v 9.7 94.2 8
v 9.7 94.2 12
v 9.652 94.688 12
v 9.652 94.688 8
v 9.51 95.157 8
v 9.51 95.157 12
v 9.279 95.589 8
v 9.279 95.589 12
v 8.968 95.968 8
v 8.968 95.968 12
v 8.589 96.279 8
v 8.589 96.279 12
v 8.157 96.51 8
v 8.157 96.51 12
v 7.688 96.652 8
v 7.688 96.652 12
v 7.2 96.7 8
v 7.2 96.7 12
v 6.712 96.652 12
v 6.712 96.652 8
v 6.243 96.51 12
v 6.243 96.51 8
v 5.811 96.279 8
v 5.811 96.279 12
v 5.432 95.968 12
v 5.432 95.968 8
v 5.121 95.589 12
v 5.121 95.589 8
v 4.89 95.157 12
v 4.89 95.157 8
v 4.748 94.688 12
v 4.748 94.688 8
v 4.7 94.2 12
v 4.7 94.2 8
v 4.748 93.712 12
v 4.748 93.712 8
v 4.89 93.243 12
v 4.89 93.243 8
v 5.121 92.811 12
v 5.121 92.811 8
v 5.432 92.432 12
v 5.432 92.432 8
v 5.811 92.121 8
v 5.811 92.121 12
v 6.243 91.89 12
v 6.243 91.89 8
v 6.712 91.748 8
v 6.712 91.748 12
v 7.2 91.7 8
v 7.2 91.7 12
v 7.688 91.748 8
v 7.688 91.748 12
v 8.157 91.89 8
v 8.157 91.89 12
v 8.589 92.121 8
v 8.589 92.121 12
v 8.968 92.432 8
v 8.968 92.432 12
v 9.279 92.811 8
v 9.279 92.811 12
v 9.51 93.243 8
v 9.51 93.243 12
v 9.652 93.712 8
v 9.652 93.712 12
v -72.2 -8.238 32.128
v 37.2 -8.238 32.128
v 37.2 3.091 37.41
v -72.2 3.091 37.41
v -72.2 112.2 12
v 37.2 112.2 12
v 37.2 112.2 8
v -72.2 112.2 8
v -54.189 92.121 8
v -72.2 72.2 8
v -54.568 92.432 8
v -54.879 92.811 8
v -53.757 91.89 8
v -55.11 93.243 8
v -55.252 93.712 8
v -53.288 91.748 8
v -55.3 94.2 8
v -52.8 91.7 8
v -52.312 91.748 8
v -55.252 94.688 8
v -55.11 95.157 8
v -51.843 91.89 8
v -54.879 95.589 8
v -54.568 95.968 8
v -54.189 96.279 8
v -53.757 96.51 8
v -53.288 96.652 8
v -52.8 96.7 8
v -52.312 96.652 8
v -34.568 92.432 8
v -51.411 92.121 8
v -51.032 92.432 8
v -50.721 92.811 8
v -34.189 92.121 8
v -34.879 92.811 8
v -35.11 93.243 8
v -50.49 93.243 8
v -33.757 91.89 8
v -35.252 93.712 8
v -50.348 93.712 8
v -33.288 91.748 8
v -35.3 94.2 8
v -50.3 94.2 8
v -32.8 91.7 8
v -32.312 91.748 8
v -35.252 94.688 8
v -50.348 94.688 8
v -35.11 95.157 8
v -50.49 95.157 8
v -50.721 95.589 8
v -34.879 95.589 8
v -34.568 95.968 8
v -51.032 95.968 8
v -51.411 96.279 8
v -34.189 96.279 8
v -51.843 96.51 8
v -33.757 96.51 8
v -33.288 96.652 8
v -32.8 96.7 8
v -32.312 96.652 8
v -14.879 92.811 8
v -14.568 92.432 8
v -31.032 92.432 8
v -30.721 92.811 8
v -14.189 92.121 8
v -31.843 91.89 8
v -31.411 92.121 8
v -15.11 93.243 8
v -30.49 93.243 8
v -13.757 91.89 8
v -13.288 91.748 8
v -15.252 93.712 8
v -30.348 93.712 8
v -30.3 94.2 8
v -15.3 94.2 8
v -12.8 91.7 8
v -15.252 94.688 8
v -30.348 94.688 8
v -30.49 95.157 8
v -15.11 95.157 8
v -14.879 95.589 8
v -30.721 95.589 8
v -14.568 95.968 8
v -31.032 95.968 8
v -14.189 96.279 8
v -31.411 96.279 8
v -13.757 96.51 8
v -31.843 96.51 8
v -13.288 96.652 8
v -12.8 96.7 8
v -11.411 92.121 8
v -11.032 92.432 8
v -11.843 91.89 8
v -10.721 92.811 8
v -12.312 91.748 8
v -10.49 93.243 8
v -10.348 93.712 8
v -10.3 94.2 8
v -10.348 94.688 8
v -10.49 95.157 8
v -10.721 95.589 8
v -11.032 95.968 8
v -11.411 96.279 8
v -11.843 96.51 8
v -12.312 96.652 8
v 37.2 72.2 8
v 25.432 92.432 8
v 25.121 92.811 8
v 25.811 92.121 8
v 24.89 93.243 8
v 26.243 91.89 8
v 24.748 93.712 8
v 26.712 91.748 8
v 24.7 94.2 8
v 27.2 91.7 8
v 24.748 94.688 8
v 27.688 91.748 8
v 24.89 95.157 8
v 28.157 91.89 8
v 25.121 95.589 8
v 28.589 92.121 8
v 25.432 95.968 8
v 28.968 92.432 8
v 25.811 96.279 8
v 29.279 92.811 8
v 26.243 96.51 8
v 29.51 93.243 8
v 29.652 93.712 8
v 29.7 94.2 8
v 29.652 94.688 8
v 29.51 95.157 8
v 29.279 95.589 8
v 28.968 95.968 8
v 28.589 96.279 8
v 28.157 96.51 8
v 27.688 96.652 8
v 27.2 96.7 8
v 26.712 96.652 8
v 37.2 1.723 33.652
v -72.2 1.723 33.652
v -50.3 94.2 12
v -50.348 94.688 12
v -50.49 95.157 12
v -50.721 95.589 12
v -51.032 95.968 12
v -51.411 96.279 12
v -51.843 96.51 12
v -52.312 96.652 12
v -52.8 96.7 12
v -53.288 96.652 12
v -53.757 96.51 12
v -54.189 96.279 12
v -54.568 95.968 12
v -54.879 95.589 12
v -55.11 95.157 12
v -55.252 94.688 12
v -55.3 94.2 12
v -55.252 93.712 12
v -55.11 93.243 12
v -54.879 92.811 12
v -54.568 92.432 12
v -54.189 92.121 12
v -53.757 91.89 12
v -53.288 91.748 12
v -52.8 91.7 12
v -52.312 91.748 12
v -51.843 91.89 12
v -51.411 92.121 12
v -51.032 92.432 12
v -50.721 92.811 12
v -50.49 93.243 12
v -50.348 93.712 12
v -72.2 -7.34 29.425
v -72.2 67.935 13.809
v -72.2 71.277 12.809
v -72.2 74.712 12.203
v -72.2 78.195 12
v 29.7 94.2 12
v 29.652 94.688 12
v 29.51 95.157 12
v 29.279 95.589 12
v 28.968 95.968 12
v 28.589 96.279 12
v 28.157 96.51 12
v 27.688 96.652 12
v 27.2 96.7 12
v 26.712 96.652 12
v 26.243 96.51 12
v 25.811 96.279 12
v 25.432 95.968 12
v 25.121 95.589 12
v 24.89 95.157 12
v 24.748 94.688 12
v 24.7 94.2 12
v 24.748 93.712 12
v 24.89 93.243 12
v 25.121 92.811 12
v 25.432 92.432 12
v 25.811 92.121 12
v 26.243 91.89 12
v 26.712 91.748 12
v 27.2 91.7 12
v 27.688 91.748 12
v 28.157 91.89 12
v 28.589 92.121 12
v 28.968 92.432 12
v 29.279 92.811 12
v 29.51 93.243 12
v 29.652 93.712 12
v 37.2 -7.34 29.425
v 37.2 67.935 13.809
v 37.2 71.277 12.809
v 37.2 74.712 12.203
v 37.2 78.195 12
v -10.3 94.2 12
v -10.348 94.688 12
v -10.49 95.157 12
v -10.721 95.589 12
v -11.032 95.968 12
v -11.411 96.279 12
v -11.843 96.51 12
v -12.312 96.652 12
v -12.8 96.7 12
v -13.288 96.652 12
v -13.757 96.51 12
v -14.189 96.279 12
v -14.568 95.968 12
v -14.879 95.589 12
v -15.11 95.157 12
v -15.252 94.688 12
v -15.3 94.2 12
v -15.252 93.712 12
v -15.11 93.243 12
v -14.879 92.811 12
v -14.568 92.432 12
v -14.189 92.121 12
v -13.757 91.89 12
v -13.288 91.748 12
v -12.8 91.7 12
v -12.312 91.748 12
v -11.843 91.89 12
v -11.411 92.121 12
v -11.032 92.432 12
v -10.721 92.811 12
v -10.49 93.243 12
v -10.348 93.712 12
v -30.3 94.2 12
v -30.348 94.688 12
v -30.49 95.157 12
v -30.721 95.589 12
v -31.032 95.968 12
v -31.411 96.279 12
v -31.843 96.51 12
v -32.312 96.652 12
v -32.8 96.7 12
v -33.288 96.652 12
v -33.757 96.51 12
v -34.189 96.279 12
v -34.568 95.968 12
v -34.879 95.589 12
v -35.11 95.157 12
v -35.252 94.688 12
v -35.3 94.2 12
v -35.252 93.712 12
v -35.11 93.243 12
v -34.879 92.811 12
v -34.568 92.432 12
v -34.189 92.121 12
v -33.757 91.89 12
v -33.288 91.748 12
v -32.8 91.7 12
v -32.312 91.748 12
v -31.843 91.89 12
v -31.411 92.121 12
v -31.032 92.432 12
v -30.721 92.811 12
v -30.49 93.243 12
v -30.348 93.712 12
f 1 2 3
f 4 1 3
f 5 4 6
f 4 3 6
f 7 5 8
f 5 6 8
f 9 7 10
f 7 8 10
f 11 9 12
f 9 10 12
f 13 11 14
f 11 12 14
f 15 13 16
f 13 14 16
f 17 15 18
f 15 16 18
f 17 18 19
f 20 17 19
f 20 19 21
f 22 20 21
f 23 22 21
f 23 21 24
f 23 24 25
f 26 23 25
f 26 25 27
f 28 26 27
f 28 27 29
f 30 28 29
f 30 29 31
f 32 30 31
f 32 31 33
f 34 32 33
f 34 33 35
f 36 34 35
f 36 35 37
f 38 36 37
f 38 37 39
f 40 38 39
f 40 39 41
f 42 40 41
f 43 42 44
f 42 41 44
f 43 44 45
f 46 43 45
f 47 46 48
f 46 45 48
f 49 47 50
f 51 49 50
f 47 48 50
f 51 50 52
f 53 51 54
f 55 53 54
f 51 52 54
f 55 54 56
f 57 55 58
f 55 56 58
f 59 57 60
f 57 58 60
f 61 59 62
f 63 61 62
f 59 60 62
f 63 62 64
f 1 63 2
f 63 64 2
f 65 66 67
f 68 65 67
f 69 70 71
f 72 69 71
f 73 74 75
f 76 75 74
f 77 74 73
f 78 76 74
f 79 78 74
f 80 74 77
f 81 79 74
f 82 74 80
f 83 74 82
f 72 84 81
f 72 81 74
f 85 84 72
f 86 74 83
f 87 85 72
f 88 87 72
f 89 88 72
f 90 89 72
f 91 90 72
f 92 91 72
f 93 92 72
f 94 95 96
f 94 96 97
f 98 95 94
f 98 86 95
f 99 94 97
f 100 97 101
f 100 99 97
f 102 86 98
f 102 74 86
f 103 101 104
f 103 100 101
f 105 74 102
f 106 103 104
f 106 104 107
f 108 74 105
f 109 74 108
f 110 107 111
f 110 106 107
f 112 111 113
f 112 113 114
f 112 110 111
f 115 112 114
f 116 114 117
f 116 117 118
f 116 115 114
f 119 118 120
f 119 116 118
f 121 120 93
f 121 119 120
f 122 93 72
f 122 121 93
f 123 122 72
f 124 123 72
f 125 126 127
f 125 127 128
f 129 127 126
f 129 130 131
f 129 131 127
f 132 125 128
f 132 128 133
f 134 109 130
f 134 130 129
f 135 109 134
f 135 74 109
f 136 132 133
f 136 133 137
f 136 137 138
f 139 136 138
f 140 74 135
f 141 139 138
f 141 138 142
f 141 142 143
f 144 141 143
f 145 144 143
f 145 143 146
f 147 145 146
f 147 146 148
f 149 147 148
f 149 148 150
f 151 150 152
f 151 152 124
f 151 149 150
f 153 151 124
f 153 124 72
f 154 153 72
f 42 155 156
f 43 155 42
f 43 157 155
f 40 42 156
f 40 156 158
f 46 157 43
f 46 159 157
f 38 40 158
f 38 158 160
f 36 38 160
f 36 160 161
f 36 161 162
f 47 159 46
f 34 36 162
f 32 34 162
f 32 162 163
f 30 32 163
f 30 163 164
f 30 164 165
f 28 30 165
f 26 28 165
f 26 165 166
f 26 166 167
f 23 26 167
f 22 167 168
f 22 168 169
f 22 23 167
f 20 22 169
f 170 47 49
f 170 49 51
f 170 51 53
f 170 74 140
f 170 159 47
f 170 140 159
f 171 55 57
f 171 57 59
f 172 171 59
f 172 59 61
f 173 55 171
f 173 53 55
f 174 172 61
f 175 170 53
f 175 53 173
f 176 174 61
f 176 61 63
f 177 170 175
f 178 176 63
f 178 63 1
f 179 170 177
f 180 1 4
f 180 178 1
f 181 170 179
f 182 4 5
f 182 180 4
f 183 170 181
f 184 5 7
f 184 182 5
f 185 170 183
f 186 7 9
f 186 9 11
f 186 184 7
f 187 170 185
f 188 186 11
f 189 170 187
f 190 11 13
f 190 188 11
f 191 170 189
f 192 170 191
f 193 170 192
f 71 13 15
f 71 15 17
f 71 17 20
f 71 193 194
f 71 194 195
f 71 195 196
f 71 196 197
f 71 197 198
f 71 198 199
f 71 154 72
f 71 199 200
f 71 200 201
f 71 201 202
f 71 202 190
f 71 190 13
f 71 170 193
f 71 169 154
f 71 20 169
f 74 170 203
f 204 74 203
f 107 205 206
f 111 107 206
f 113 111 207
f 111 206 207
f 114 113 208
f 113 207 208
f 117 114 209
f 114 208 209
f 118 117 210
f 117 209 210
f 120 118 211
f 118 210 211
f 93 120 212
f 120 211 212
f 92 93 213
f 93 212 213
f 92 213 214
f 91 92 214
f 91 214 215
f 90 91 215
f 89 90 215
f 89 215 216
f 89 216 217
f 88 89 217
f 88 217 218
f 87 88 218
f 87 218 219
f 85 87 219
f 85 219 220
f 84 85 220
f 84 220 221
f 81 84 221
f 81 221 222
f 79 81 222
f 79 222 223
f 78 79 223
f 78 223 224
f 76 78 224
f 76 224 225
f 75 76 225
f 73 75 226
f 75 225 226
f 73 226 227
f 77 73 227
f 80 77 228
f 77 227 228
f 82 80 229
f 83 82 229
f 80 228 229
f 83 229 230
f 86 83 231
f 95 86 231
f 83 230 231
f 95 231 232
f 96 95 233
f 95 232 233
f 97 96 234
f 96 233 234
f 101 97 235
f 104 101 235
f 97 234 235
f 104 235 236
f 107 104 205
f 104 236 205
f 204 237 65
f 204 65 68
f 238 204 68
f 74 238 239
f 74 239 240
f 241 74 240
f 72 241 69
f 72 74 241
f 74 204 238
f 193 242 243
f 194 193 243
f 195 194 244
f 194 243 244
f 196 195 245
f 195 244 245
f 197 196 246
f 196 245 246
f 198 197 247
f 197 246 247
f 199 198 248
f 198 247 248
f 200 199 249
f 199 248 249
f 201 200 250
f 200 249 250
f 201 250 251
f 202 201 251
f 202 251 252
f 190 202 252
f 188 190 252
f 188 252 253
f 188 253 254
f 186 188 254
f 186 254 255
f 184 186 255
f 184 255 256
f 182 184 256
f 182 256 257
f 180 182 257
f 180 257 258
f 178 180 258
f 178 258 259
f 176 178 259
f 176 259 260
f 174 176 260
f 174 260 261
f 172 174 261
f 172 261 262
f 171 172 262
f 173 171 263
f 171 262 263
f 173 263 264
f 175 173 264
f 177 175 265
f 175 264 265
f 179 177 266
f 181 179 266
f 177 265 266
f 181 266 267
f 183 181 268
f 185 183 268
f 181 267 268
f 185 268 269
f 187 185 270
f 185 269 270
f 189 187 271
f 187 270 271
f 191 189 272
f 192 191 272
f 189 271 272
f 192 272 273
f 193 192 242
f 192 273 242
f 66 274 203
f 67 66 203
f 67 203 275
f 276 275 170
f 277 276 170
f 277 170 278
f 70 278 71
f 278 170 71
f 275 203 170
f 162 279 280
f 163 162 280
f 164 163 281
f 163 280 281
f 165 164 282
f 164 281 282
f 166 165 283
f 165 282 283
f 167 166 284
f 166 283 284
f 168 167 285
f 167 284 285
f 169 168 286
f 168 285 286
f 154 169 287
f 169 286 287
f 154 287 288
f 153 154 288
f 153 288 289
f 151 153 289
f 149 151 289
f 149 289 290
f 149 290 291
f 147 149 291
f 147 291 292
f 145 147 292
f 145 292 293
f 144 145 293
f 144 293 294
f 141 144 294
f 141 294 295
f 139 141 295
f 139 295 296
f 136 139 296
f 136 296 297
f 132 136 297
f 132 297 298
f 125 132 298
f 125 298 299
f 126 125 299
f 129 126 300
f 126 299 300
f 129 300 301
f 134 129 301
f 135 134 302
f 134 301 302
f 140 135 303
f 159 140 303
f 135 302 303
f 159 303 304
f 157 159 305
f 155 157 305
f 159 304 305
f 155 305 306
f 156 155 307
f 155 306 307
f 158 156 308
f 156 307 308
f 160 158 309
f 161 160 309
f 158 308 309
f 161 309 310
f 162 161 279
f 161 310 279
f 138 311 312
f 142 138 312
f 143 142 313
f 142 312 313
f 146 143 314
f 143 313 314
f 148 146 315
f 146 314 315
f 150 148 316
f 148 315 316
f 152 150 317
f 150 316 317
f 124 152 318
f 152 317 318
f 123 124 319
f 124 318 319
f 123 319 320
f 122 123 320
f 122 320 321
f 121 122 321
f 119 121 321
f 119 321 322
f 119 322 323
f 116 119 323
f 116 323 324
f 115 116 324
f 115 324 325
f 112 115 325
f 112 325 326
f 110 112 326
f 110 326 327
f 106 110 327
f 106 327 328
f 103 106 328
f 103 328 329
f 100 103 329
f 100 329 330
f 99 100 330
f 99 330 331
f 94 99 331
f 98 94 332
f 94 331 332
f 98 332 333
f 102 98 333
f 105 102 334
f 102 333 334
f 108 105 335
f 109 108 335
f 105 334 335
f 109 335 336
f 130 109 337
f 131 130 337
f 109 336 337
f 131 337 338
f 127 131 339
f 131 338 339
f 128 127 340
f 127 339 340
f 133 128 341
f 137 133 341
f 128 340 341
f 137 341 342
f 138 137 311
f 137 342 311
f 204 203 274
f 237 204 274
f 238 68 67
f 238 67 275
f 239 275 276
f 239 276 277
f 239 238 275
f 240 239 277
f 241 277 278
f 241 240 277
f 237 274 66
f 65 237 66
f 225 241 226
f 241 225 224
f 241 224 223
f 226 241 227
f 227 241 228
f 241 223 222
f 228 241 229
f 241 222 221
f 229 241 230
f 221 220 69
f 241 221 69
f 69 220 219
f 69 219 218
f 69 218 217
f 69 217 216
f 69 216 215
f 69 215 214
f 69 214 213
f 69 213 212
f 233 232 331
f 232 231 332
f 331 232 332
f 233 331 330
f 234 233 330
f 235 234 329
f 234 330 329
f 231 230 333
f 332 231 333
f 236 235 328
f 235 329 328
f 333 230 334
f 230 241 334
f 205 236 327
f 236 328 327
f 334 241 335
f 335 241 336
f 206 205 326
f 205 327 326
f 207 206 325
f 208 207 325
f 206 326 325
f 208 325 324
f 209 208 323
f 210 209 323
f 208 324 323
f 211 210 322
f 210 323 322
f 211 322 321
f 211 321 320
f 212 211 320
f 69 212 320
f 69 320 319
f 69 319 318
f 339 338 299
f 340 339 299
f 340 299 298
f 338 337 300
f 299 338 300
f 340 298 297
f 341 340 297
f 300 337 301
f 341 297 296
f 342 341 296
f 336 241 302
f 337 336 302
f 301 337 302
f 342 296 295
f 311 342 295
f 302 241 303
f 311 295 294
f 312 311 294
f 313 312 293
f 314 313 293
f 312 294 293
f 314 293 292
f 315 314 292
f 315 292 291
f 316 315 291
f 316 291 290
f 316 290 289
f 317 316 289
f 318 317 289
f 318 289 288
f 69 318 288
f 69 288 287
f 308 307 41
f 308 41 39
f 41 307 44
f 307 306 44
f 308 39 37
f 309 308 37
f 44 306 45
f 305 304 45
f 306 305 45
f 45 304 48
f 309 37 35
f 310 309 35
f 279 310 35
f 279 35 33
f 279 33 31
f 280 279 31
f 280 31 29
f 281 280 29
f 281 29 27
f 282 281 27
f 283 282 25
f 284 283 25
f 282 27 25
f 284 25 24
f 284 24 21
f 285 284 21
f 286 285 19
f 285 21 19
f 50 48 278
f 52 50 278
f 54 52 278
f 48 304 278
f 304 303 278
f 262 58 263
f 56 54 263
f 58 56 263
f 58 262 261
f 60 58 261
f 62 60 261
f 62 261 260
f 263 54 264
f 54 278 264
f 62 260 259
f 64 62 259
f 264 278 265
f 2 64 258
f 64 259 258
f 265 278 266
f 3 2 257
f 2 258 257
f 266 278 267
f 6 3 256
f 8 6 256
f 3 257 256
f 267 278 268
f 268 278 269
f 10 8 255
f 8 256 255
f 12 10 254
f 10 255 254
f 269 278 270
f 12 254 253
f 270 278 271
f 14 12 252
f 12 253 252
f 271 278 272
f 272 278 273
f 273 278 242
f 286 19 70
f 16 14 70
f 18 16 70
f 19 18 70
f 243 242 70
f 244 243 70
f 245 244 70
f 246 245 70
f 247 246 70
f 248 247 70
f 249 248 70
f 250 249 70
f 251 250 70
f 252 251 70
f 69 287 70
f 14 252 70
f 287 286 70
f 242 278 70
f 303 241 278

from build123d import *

# Parameters (mm, degrees)
SKETCH1_W           = 109.4
SKETCH1_H           = 109.4
SKETCH1_W_2         = 79.4
SKETCH1_H_2         = 79.4
SKETCH1_R           = 6
SKETCH1_R_2         = 1.5
BOSS_EXTRUDE1_DEPTH = 8
BOSS_EXTRUDE2_DEPTH = 109.4
FILLET1_R           = 30
SKETCH5_W           = 8
SKETCH5_H           = 149.4
BOSS_EXTRUDE3_DEPTH = 109.4
SKETCH3_W           = 8
SKETCH3_H           = 109.4
CUT_EXTRUDE4_DEPTH  = 135
SKETCH7_W           = 8
SKETCH7_H           = 40
CUT_EXTRUDE5_DEPTH  = 135
SKETCH4_R           = 2.5
CUT_EXTRUDE6_DEPTH  = 10


with BuildPart() as part:
    # Sketch1 → Boss-Extrude1 (new body)
    # profile 1 of 2: a face of its own
    with BuildSketch(Plane.XY):
        with Locations((-17.5, 17.5)):
            Rectangle(SKETCH1_W, SKETCH1_H)
        with Locations((-17.5, 17.5)):
            Rectangle(SKETCH1_W_2, SKETCH1_H_2, mode=Mode.SUBTRACT)
    # profile 2 of 2: a face of its own
    with BuildSketch(Plane.XY):
        with Locations((-17.5, 17.5)):
            Rectangle(SKETCH1_W_2, SKETCH1_H_2)
        with Locations((-35, 0)):
            Circle(SKETCH1_R, mode=Mode.SUBTRACT)
        Circle(SKETCH1_R, mode=Mode.SUBTRACT)
        with Locations((0, 35)):
            Circle(SKETCH1_R, mode=Mode.SUBTRACT)
        with Locations((-35, 35)):
            Circle(SKETCH1_R, mode=Mode.SUBTRACT)
        with Locations((-52.809903828, -17.809903828)):
            Circle(SKETCH1_R_2, mode=Mode.SUBTRACT)
        with Locations((-17.5, -17.5)):
            Circle(SKETCH1_R_2, mode=Mode.SUBTRACT)
        with Locations((17.5, -17.5)):
            Circle(SKETCH1_R_2, mode=Mode.SUBTRACT)
        with Locations((17.5, 17.5)):
            Circle(SKETCH1_R_2, mode=Mode.SUBTRACT)
        with Locations((-17.5, 17.5)):
            Circle(SKETCH1_R_2, mode=Mode.SUBTRACT)
        with Locations((-52.5, 17.5)):
            Circle(SKETCH1_R_2, mode=Mode.SUBTRACT)
        with Locations((17.5, 52.5)):
            Circle(SKETCH1_R_2, mode=Mode.SUBTRACT)
        with Locations((-17.5, 52.5)):
            Circle(SKETCH1_R_2, mode=Mode.SUBTRACT)
        with Locations((-52.5, 52.5)):
            Circle(SKETCH1_R_2, mode=Mode.SUBTRACT)
    extrude(amount=BOSS_EXTRUDE1_DEPTH)



with BuildPart() as body_2:
    # Sketch2 → Boss-Extrude2 (new body)
    with BuildSketch(Plane(origin=(37.2, 0, 0), x_dir=(0, 0, -1), z_dir=(1, 0, 0))):
        Polygon((-8, 72.2), (-33.651510749, 1.723053441), (-29.425328132, -7.340024429), (-32.127552961, -8.237713324), (-37.410281233, 3.091134014), (-12, 72.905307923), (-12, 112.2), (-8, 112.2), align=None)
    extrude(amount=-BOSS_EXTRUDE2_DEPTH)

    # Fillet1
    fillet1_edges = [body_2.edges().sort_by_distance(p)[0] for p in [
        (-17.5, 72.905307923, 12),
    ]]
    fillet(fillet1_edges, radius=FILLET1_R)


with BuildPart() as part_1:
    add(part.part)

    add(body_2.part)  # Boss-Extrude3 merges body 2
    # Sketch5 → Boss-Extrude3 (add)
    with BuildSketch(Plane(origin=(37.2, 0, 0), x_dir=(0, 0, -1), z_dir=(1, 0, 0))):
        with Locations((-4, 37.5)):
            Rectangle(SKETCH5_W, SKETCH5_H)
    extrude(amount=-BOSS_EXTRUDE3_DEPTH)

    # Sketch3 → Cut-Extrude4 (cut)
    with BuildSketch(Plane(origin=(37.2, 0, 0), x_dir=(0, 0, -1), z_dir=(1, 0, 0))):
        with Locations((-4, 17.5)):
            Rectangle(SKETCH3_W, SKETCH3_H)
    extrude(amount=-CUT_EXTRUDE4_DEPTH, mode=Mode.SUBTRACT)

    # Sketch7 → Cut-Extrude5 (cut)
    with BuildSketch(Plane(origin=(37.2, 0, 0), x_dir=(0, 0, -1), z_dir=(1, 0, 0))):
        with Locations((-4, 92.2)):
            Rectangle(SKETCH7_W, SKETCH7_H)
    extrude(amount=-CUT_EXTRUDE5_DEPTH, mode=Mode.SUBTRACT)

    # Sketch4 → Cut-Extrude6 (cut)
    with BuildSketch(Plane.XY.offset(12)):
        with Locations((-52.8, 94.2)):
            Circle(SKETCH4_R)
        with Locations((-32.8, 94.2)):
            Circle(SKETCH4_R)
        with Locations((-12.8, 94.2)):
            Circle(SKETCH4_R)
        with Locations((7.2, 94.2)):
            Circle(SKETCH4_R)
        with Locations((27.2, 94.2)):
            Circle(SKETCH4_R)
    extrude(amount=-CUT_EXTRUDE6_DEPTH, mode=Mode.SUBTRACT)


solid = part_1.part
